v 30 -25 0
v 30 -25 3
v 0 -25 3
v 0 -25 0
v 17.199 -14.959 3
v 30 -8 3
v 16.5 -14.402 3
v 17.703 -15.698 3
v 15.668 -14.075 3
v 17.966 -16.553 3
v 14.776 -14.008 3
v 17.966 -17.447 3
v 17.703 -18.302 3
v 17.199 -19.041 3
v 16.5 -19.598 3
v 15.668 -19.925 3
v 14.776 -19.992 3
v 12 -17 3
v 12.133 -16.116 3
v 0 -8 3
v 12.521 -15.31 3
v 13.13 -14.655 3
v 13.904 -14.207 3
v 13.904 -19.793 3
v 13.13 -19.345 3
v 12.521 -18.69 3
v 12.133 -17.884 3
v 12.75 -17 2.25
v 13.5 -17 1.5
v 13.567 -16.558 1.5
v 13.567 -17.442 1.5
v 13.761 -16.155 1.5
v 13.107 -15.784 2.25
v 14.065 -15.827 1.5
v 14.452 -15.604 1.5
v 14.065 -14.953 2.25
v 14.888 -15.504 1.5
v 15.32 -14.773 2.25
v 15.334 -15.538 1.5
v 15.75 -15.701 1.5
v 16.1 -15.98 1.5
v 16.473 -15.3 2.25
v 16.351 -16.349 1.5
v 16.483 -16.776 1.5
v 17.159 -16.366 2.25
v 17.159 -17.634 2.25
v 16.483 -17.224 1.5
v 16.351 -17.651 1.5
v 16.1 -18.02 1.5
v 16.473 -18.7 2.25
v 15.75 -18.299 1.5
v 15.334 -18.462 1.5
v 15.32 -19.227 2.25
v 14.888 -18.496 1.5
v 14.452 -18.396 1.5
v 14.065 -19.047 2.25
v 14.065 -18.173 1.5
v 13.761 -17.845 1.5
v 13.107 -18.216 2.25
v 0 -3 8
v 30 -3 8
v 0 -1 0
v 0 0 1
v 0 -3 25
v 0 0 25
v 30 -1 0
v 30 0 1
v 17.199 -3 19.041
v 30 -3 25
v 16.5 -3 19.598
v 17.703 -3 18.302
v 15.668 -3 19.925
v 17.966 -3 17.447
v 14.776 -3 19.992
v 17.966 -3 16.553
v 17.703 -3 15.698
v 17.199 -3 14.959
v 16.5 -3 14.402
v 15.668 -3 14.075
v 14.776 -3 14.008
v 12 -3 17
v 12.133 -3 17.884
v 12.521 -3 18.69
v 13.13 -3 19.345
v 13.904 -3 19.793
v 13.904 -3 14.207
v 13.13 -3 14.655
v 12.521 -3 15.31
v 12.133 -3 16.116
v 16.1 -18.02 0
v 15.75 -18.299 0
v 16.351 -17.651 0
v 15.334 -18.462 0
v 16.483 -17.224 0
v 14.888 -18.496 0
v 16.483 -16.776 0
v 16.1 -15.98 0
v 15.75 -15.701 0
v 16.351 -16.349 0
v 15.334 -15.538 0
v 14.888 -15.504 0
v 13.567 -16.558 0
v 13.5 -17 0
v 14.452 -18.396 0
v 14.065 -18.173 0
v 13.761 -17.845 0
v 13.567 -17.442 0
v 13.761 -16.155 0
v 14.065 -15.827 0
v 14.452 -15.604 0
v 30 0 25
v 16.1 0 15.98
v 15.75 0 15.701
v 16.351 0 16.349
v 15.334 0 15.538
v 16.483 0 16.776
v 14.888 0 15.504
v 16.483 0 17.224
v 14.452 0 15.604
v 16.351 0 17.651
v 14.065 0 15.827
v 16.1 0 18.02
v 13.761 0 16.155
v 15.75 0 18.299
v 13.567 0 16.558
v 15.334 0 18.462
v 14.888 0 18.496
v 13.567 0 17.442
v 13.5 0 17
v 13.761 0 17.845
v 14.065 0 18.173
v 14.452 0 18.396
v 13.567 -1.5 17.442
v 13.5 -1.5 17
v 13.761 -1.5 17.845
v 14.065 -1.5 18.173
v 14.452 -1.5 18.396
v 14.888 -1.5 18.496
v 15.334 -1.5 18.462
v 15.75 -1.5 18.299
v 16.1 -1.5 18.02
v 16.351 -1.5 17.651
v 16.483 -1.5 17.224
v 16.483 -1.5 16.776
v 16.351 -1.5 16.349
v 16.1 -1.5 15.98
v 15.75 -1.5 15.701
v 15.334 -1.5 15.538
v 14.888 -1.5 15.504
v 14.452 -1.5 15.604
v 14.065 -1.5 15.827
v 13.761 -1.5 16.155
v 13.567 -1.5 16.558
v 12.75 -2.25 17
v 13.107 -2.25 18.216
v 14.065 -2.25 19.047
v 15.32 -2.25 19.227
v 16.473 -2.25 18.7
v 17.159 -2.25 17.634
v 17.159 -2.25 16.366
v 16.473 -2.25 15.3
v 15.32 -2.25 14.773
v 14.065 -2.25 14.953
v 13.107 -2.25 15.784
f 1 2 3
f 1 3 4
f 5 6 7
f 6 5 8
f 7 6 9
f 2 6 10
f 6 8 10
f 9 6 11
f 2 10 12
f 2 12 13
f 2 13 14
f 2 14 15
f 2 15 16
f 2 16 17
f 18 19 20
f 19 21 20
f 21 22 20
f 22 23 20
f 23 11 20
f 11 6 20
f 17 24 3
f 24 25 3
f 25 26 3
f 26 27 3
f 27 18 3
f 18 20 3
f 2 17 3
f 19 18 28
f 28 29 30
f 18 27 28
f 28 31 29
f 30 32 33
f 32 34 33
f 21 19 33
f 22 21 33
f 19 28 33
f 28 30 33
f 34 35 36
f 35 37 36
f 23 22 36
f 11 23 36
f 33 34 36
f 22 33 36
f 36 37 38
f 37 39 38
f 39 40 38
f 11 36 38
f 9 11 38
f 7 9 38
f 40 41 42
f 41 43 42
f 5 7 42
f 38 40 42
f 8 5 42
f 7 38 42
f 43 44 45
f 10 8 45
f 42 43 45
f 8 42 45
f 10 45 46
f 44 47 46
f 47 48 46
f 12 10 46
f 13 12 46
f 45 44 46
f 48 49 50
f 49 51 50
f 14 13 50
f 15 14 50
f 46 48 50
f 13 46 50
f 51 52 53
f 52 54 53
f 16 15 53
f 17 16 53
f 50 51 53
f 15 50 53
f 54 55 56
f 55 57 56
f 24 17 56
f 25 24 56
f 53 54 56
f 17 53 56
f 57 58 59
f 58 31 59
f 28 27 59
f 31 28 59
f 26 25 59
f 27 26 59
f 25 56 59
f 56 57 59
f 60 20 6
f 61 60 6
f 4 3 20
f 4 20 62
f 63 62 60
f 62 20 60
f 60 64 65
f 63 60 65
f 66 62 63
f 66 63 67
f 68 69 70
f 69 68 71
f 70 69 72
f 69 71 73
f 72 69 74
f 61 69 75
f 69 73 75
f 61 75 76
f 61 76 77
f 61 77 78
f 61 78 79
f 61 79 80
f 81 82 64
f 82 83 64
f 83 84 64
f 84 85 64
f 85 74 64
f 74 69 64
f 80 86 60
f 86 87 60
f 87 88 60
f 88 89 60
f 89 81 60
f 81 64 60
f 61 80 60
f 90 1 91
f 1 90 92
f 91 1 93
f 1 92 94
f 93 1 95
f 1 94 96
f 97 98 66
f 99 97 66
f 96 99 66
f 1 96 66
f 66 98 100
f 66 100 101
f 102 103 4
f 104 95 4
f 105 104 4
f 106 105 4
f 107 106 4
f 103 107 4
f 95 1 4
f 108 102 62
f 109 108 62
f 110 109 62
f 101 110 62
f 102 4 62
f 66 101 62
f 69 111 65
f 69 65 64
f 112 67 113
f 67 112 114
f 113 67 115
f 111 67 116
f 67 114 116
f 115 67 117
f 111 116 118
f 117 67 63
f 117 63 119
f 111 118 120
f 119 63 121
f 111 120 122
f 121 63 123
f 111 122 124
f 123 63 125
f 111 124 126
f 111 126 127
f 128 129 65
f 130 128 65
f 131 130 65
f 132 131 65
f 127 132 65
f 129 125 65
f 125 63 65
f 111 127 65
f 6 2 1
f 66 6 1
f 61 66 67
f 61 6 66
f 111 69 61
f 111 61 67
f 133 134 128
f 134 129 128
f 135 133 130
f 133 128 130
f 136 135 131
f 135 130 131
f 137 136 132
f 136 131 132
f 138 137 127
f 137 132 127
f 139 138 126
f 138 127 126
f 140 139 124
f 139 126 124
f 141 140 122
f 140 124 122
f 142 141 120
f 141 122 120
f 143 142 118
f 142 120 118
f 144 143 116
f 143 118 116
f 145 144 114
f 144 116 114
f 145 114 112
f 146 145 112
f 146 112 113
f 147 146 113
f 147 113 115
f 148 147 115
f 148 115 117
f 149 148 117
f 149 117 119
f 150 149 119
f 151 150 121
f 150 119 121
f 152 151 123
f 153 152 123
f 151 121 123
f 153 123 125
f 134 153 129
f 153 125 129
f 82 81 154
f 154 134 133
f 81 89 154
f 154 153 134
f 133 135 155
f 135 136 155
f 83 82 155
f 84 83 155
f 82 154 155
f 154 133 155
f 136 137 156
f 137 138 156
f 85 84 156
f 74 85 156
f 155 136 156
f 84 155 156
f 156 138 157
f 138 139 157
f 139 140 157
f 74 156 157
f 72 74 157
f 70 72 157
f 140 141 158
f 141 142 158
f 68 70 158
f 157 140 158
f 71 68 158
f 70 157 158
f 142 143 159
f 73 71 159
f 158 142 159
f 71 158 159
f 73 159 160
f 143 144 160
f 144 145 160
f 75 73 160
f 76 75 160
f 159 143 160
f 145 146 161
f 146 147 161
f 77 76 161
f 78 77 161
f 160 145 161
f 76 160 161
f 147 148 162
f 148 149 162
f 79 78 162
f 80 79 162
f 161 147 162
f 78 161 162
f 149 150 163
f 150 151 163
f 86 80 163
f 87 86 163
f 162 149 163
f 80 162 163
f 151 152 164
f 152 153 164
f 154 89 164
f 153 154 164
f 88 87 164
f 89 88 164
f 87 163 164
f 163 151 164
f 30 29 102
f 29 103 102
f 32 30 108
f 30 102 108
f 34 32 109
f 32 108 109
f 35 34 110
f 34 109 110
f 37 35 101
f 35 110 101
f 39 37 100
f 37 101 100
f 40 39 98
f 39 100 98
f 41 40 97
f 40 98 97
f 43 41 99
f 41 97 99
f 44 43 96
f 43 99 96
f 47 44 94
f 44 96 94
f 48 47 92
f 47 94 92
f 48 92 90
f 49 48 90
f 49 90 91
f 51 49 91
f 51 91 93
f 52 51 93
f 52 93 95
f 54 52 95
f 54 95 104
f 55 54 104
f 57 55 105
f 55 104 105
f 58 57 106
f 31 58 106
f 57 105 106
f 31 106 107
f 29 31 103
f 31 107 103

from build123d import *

# Parameters (mm, degrees)
F1_DEPTH       = 30
F2_SIZE        = 5
F3_SIZE        = 1
F5_D           = 3
F5_CSINK_D     = 6
F5_CSINK_ANGLE = 90
F7_D           = 3
F7_CSINK_D     = 6
F7_CSINK_ANGLE = 90


with BuildPart() as f1:
    # F0 (on Right) → F1 (new body)
    with BuildSketch(Plane.YZ):
        Polygon((-25, 0), (0, 0), (0, 25), (-3, 25), (-3, 3), (-25, 3), align=None)
    extrude(amount=F1_DEPTH)

    # F2
    f2_edges = [f1.edges().sort_by_distance(p)[0] for p in [
        (15, -3, 3),
    ]]
    chamfer(f2_edges, length=F2_SIZE)

    # F3
    f3_edges = [f1.edges().sort_by_distance(p)[0] for p in [
        (15, 0, 0),
    ]]
    chamfer(f3_edges, length=F3_SIZE)

    # F5 (through all)
    with Locations(Plane.XZ.offset(3)):
        with Locations((15, 17)):
            CounterSinkHole(F5_D / 2, F5_CSINK_D / 2, counter_sink_angle=F5_CSINK_ANGLE)

    # F7 (through all)
    with Locations(Plane.XY.offset(3)):
        with Locations((15, -17)):
            CounterSinkHole(F7_D / 2, F7_CSINK_D / 2, counter_sink_angle=F7_CSINK_ANGLE)


solid = f1.part
